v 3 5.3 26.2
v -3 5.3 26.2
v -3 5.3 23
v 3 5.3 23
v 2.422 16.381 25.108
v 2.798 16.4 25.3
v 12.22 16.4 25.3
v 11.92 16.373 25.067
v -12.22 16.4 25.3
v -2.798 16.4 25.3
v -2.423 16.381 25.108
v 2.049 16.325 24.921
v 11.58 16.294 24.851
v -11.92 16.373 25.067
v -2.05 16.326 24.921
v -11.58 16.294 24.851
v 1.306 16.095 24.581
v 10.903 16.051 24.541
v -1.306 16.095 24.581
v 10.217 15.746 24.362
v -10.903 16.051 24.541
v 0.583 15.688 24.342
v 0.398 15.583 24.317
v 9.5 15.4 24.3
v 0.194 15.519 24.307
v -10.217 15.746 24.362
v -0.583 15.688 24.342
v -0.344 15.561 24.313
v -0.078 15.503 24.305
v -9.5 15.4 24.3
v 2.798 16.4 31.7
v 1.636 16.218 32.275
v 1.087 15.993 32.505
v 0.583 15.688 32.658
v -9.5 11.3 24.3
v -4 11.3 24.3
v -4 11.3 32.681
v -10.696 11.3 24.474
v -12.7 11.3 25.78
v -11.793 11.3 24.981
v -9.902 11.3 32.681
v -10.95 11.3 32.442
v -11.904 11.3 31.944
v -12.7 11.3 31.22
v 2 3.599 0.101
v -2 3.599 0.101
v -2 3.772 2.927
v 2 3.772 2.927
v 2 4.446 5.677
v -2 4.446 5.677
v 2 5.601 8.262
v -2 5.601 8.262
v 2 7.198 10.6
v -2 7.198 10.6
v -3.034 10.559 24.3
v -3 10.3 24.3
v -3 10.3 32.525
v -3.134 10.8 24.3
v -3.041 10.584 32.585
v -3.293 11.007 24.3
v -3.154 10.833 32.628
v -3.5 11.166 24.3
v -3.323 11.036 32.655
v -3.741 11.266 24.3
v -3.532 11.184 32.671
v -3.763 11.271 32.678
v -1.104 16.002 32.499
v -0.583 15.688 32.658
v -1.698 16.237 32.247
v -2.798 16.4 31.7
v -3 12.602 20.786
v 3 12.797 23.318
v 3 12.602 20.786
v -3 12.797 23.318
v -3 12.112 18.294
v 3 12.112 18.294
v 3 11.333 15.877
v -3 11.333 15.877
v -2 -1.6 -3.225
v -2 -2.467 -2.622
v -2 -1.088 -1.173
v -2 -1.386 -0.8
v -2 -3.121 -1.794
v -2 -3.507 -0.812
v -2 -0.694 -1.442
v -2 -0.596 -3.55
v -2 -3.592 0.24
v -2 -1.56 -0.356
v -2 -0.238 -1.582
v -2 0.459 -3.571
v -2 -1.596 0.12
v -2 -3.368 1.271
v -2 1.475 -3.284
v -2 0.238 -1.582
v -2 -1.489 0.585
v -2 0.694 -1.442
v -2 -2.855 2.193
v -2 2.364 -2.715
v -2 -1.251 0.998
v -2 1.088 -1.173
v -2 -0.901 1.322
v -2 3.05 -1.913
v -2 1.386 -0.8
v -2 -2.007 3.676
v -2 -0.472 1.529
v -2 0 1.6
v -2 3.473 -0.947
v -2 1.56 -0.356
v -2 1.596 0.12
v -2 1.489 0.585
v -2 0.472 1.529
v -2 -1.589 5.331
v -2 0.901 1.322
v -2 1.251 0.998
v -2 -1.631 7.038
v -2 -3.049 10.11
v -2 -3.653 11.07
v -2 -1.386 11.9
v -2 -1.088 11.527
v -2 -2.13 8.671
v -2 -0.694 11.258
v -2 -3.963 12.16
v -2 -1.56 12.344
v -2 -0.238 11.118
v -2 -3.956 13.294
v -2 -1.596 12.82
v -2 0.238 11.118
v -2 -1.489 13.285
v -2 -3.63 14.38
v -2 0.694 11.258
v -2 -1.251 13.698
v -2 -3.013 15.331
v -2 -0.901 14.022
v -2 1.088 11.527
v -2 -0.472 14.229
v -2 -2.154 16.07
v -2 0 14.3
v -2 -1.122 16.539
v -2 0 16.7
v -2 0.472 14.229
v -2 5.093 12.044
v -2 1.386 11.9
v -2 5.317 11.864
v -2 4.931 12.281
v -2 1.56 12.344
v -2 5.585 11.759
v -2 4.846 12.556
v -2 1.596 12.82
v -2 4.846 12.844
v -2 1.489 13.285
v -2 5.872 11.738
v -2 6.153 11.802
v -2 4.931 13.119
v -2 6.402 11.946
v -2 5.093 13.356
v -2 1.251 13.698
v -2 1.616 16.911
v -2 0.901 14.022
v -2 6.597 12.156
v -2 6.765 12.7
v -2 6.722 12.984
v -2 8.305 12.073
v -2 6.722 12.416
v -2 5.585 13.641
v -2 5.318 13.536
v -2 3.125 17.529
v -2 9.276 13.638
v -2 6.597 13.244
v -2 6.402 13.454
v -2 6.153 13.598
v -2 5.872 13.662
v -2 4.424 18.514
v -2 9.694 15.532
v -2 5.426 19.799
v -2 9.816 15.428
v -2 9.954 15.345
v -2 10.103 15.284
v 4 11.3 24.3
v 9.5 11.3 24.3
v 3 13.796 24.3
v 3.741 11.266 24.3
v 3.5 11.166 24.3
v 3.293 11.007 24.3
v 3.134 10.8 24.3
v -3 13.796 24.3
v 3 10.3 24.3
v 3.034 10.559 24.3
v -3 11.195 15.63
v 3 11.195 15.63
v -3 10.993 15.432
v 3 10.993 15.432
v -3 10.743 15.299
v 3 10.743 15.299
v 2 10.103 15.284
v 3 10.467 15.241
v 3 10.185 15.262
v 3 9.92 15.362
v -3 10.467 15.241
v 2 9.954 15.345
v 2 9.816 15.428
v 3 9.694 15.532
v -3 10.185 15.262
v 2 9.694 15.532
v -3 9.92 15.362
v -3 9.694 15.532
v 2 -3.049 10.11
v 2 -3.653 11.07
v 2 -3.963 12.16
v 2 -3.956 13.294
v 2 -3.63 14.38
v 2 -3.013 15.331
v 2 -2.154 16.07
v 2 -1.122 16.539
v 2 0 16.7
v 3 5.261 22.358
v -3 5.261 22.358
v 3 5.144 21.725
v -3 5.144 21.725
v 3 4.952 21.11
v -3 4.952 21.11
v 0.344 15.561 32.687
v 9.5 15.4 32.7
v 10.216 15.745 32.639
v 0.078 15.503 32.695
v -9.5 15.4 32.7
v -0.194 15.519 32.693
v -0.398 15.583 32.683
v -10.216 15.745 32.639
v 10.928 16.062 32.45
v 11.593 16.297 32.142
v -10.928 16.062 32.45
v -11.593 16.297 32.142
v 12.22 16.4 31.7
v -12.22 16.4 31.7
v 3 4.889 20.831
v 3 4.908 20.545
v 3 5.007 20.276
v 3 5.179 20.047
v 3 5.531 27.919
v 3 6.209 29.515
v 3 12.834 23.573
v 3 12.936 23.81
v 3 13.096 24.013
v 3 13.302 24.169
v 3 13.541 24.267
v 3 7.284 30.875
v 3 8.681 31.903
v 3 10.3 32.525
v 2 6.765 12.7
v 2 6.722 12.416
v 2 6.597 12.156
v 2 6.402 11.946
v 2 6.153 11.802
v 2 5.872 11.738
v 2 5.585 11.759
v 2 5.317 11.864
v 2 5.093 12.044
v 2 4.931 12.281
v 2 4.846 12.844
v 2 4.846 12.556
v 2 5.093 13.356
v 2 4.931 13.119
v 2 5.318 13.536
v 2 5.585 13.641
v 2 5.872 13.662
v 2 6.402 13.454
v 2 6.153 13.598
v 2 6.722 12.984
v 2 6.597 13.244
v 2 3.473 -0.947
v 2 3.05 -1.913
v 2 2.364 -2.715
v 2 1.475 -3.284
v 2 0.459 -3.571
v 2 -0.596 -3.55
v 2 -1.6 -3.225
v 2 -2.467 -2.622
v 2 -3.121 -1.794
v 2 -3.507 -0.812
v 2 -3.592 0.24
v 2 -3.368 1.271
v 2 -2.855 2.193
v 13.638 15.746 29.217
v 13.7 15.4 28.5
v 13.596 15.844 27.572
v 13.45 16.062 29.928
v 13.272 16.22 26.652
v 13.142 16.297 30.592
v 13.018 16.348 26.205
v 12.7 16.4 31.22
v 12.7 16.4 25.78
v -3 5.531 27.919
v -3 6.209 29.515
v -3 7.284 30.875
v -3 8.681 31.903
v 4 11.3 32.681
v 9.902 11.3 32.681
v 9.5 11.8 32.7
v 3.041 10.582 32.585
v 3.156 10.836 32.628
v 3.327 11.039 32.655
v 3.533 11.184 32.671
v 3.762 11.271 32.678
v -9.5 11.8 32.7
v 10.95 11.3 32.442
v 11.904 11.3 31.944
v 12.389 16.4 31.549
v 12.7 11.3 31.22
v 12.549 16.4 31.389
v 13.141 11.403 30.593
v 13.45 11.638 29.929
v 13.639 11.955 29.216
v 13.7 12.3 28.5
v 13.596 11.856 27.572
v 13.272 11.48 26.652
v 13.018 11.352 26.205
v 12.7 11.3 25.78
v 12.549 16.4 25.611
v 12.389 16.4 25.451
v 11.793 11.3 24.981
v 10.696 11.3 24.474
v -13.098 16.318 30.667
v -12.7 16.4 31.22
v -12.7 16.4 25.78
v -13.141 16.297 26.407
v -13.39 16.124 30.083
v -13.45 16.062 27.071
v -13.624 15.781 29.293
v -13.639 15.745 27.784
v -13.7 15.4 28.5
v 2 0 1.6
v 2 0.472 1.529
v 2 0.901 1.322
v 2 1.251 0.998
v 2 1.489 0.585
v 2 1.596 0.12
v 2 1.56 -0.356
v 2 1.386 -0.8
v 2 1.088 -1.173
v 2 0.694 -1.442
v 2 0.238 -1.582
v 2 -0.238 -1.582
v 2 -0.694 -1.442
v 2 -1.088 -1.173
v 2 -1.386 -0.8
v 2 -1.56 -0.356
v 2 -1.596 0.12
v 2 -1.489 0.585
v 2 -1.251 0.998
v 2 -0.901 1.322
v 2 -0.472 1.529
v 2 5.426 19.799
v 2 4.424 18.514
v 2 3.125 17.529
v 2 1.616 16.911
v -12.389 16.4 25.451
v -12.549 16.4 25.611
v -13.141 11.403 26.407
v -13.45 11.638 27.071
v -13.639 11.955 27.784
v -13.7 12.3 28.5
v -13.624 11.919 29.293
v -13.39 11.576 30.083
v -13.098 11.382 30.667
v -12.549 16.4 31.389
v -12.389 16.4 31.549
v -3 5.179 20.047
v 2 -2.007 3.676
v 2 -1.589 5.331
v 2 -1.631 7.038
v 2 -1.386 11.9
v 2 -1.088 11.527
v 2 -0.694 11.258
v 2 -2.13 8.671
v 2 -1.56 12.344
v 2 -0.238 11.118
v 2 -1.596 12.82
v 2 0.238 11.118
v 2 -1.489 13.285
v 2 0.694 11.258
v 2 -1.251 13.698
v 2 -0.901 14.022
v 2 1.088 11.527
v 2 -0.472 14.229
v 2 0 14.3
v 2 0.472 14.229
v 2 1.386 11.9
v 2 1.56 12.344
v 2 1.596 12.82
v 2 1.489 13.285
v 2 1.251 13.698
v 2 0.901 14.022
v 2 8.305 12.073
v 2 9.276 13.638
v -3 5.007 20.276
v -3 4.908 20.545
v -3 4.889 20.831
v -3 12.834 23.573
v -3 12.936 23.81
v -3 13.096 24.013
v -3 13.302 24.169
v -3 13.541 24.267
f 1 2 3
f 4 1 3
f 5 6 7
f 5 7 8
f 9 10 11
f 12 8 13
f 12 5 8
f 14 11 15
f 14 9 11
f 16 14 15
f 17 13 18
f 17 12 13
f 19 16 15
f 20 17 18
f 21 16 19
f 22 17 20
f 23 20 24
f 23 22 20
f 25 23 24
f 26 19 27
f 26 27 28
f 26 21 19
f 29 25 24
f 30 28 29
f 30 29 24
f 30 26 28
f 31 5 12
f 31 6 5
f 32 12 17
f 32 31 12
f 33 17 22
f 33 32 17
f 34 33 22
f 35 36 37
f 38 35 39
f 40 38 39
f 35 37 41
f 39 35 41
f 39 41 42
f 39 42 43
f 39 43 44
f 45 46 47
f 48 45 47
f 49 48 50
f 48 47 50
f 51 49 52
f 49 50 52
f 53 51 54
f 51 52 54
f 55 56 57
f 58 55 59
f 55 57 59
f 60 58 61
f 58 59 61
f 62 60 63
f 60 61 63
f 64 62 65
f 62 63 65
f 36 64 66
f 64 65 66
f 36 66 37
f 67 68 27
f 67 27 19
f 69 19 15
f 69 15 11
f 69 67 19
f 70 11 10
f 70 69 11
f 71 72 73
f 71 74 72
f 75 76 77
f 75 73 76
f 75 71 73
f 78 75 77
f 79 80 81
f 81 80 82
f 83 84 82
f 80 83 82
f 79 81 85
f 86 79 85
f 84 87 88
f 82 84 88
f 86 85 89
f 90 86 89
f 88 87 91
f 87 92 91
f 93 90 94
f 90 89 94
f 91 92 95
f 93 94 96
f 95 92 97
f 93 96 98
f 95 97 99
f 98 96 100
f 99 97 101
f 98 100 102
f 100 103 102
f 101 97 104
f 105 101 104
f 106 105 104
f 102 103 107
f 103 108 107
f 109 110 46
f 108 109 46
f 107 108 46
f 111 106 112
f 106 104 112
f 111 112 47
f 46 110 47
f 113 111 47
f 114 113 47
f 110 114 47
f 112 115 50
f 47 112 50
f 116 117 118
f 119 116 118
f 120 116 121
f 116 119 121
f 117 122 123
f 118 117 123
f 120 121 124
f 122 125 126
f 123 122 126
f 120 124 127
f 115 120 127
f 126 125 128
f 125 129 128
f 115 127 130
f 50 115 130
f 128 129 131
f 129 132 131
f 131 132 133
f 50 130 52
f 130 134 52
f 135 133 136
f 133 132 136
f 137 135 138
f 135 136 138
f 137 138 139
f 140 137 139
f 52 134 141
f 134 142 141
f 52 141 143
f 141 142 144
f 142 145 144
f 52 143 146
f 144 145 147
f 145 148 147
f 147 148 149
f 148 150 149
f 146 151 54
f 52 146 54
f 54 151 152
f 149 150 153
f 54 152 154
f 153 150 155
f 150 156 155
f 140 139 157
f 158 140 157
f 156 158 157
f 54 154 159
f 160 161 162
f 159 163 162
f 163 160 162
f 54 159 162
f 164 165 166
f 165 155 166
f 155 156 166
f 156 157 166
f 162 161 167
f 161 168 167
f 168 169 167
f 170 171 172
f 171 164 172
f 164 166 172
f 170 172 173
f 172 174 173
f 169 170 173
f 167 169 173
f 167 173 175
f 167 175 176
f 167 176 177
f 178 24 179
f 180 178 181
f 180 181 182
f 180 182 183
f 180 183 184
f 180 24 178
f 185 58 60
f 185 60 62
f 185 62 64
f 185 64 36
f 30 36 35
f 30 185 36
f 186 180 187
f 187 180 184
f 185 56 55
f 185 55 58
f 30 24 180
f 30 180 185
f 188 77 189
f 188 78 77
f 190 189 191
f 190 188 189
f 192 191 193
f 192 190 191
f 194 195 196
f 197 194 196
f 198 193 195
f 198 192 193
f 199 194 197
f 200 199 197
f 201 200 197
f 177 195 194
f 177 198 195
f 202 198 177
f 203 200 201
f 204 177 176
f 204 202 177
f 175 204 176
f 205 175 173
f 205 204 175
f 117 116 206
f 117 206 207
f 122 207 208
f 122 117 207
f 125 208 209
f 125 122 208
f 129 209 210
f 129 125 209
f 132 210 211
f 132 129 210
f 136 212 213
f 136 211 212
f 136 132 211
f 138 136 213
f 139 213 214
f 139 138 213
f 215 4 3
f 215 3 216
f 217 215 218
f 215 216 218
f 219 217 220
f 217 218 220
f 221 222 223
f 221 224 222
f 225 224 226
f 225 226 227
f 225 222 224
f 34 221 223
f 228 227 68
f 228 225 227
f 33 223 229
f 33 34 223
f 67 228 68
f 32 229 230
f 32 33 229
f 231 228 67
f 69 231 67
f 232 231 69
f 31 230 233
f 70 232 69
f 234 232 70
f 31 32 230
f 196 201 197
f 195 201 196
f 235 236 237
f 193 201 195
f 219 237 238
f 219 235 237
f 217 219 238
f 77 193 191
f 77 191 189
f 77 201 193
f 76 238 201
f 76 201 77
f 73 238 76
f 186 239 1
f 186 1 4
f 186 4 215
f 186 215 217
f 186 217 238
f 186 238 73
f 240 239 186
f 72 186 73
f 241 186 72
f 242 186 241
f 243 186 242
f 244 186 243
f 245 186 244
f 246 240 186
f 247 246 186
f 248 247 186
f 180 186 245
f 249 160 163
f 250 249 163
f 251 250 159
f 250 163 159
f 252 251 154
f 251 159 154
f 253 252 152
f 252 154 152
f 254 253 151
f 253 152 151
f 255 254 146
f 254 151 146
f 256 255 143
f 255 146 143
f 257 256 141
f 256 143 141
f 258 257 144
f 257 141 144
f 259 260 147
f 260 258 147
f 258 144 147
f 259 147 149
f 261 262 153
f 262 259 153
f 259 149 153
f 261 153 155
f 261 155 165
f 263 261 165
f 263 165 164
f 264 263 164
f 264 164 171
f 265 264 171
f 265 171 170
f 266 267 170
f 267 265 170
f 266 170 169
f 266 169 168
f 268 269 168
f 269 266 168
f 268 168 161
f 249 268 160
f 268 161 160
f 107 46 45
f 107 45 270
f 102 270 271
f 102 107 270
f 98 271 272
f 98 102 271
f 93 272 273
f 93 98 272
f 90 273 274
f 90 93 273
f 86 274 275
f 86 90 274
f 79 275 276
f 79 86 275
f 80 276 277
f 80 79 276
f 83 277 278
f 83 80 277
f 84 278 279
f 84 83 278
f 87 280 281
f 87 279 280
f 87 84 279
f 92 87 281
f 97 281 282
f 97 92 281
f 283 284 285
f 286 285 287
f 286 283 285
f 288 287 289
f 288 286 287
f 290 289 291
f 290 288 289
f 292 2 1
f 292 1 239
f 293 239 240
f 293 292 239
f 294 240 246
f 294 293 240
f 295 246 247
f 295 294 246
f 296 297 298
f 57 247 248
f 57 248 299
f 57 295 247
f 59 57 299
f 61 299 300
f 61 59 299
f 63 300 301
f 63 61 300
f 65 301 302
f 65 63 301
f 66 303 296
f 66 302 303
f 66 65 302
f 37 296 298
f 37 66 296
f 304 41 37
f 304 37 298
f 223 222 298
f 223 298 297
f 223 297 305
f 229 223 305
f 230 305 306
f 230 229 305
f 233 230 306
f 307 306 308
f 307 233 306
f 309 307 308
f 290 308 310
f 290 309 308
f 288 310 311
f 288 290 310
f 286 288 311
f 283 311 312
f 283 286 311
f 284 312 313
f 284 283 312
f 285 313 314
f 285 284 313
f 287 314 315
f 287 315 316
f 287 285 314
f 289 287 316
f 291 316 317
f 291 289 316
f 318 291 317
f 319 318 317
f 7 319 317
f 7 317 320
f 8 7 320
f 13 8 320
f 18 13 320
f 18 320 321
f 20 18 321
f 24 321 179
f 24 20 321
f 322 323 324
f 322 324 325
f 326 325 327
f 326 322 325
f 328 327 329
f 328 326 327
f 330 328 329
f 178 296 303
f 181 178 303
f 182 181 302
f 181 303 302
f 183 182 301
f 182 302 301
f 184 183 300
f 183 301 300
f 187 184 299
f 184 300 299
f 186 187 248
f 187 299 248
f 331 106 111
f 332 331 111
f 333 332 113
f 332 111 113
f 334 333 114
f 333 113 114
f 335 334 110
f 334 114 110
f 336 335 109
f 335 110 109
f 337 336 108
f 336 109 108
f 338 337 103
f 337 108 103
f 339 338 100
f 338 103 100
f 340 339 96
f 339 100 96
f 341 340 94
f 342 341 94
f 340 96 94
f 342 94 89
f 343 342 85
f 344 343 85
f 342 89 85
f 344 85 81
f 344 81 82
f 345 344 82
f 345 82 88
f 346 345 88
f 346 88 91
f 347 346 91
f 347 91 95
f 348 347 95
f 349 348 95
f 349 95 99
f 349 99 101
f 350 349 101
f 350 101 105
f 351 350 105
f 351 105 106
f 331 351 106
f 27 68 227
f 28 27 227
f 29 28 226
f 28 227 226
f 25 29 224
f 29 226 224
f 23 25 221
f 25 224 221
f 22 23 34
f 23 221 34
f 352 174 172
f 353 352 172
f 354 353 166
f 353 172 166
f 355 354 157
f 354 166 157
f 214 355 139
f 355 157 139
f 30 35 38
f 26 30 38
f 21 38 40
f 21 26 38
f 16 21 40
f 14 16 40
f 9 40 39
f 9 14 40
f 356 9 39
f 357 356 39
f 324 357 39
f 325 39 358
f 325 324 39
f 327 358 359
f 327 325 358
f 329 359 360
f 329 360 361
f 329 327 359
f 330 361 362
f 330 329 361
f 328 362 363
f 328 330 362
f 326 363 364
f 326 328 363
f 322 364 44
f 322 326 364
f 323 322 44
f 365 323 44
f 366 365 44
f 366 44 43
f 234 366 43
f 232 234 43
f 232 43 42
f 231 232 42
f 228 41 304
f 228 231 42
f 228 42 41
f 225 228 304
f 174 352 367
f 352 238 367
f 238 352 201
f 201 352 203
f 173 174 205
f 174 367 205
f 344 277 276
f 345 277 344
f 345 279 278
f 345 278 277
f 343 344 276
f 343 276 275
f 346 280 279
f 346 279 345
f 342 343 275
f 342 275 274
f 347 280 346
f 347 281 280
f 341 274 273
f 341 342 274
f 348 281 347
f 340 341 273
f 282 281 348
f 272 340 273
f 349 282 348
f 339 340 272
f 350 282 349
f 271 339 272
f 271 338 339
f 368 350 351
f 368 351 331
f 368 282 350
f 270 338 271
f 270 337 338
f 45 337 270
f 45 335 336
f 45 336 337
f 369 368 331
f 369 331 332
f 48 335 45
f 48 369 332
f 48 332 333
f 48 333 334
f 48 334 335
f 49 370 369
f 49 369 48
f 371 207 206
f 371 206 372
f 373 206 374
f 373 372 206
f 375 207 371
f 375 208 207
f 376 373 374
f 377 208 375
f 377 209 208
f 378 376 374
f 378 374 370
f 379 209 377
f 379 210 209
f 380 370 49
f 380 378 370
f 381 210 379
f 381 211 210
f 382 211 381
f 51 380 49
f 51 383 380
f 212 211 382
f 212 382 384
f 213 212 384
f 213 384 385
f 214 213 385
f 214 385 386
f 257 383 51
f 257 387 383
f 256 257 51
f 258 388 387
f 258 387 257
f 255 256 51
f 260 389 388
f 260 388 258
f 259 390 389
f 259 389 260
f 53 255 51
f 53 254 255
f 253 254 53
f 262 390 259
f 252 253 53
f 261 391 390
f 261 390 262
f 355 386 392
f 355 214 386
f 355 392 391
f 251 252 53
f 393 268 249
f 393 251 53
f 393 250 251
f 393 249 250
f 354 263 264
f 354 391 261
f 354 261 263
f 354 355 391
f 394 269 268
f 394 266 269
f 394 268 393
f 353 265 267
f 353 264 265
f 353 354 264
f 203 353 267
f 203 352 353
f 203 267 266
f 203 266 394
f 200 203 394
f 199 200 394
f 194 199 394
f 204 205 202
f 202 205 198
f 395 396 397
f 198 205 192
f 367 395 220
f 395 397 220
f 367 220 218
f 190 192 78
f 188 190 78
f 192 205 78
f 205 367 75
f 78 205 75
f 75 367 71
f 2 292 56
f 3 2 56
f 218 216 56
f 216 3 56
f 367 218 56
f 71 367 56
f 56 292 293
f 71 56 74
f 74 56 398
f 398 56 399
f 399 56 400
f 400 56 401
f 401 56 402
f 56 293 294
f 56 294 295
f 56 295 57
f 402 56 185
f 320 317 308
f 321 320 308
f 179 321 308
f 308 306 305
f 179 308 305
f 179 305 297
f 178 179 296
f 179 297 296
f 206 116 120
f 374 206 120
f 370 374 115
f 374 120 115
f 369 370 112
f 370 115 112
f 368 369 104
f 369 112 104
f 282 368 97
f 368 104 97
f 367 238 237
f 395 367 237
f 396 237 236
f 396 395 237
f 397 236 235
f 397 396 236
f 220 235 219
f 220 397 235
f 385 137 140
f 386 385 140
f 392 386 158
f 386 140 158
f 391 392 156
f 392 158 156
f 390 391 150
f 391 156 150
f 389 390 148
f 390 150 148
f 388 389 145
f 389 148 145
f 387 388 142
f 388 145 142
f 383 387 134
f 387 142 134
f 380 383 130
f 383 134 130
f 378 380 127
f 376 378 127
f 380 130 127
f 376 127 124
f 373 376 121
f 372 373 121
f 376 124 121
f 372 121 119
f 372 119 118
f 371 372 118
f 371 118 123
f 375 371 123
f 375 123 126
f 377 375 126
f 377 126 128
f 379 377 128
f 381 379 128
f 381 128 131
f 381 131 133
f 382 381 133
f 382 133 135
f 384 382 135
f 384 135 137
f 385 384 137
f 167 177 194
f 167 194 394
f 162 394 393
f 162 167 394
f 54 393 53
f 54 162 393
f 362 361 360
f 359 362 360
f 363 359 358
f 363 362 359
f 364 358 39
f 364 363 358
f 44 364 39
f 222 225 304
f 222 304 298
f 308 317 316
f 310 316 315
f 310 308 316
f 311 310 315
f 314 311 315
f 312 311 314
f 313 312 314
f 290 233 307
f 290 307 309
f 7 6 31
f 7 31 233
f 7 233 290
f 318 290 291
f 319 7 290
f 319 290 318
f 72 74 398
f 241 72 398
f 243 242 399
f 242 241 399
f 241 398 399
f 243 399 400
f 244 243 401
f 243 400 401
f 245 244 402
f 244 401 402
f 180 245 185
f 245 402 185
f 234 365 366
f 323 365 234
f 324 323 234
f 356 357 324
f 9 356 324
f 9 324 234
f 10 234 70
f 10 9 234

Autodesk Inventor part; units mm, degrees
sketch "Skizze_4" plane through (0, 0, 0) normal (1, 0, 0) x (0, 1, 0)
  line L0 (14.3, 31.7) -> (11.8, 31.7)
  arc A0 (11.8, 31.7) -> (6.3, 26.2) centre (11.8, 26.2) ccw
  line L1 (6.3, 26.2) -> (6.3, 23)
  arc A1 (0, 16.7) -> (6.3, 23) centre (0, 23) ccw
  arc A2 (0, 16.7) -> (-3.0486, 10.1104) centre (0, 12.7) ccw
  arc A3 (-2.8546, 2.1934) -> (-3.0486, 10.1104) centre (-7.8502, 6.0319) ccw
  arc A4 (-2.8546, 2.1934) -> (3.5986, 0.1012) centre (0, 0) ccw
  arc A5 (7.1983, 10.6002) -> (3.5986, 0.1012) centre (19.3921, 0.5528) ccw
  arc A6 (7.1983, 10.6002) -> (11.8856, 24.4701) centre (-8.7, 23.7) ccw
  arc A7 (12.685, 25.3) -> (11.8856, 24.4701) centre (12.685, 24.5) ccw
  line L2 (12.685, 25.3) -> (14.3, 25.3)
  line L3 (14.3, 25.3) -> (14.3, 31.7)
  circle A8 centre (5.8, 12.7) radius 0.965
extrude "Extrusion1" add sketch "Skizze_4" along normal mid plane 4
sketch "Sketch_1" plane through (0, 0, 0) normal (1, 0, 0) x (0, 1, 0)
  line L0 (14.3, 32.7) -> (11.8, 32.7)
  arc A0 (11.8, 32.7) -> (5.3, 26.2) centre (11.8, 26.2) ccw
  line L1 (5.3, 26.2) -> (5.3, 23)
  arc A1 (4.9518, 21.1105) -> (5.3, 23) centre (0, 23) ccw
  arc A2 (4.9518, 21.1105) -> (5.1789, 20.0469) centre (5.8861, 20.754) ccw
  line L2 (5.1789, 20.0469) -> (9.6942, 15.5317)
  arc A3 (9.6942, 15.5317) -> (11.3334, 15.8766) centre (10.4013, 16.2388) ccw
  arc A4 (11.3334, 15.8766) -> (12.7966, 23.3177) centre (-8.8, 23.7) ccw
  arc A5 (13.7965, 24.3) -> (12.7966, 23.3177) centre (13.7965, 23.3) ccw
  line L3 (13.7965, 24.3) -> (14.3, 24.3)
  arc A6 (14.3, 24.3) -> (15.3, 25.3) centre (14.3, 25.3) ccw
  line L4 (15.3, 25.3) -> (15.3, 31.7)
  arc A7 (15.3, 31.7) -> (14.3, 32.7) centre (14.3, 31.7) ccw
extrude "Extrusion2" add sketch "Sketch_1" along normal mid plane 6
sketch "Skizze_5_ALT_Drilling_1" plane through (0, 0, 0) normal (0, 1, 0) x (-1, 0, 0)
  line L0 (10, 0) -> (-10, 0)
  line L1 (-10, 0) -> (-10, 1.6)
  line L2 (-10, 1.6) -> (10, 1.6)
  line L3 (10, 1.6) -> (10, 0)
  line L4 (10, 0) -> (-10, 0)
revolve "Revolution1" cut sketch "Skizze_5_ALT_Drilling_1" angle 360 about axis through (-10, 0, 0) along (-1, 0, 0)
sketch "Skizze_6_ALT_Drilling_2" plane through (0, 0, 0) normal (0, 1, 0) x (-1, 0, 0)
  line L0 (10, 12.7) -> (-10, 12.7)
  line L1 (-10, 12.7) -> (-10, 14.3)
  line L2 (-10, 14.3) -> (10, 14.3)
  line L3 (10, 14.3) -> (10, 12.7)
  line L4 (10, 12.7) -> (-10, 12.7)
revolve "Revolution2" cut sketch "Skizze_6_ALT_Drilling_2" angle 360 about axis through (-10, 0, 12.7) along (-1, 0, 0)
sketch "Sketch_2" plane through (0, 16.4, 0) normal (0, 1, 0) x (1, 0, 0)
  arc A0 (-9.5, -24.3) -> (-9.5, -32.7) centre (-9.5, -28.5) ccw
  line L0 (-9.5, -32.7) -> (9.5, -32.7)
  arc A1 (9.5, -32.7) -> (9.5, -24.3) centre (9.5, -28.5) ccw
  line L1 (9.5, -24.3) -> (-9.5, -24.3)
extrude "Extrusion3" add sketch "Sketch_2" against normal blind 6.1
sketch "Sketch_3" plane through (0, 0, 0) normal (1, 0, 0) x (0, 1, 0)
  line L0 (-12.0571, 36.1801) -> (-12.0571, -15.6384)
  line L1 (-12.0571, -15.6384) -> (20.4908, -15.6384)
  line L2 (20.4908, -15.6384) -> (20.4908, 36.1801)
  line L3 (20.4908, 36.1801) -> (-12.0571, 36.1801)
  line L4 (15.4, 32.7) -> (11.8, 32.7)
  arc A0 (11.8, 32.7) -> (5.3, 26.2) centre (11.8, 26.2) ccw
  line L5 (5.3, 26.2) -> (-6.4975, 26.2)
  line L6 (-6.4975, 26.2) -> (-6.4975, -9.3)
  line L7 (-6.4975, -9.3) -> (15.4, -9.3)
  line L8 (15.4, -9.3) -> (15.4, 24.3)
  arc A1 (15.4, 24.3) -> (16.4, 25.3) centre (15.4, 25.3) ccw
  line L9 (16.4, 25.3) -> (16.4, 31.7)
  arc A2 (16.4, 31.7) -> (15.4, 32.7) centre (15.4, 31.7) ccw
extrude "Extrusion4" cut sketch "Sketch_3" along normal mid plane 40
sketch "Sketch_4" plane through (0, 0, 32.7) normal (0, 0, 1) x (1, 0, 0)
  line L0 (-22.6525, -16.2217) -> (-3, -16.2217)
  line L1 (-3, -16.2217) -> (-3, 10.3)
  arc A0 (-3, 10.3) -> (-4, 11.3) centre (-4, 10.3) ccw
  line L2 (-4, 11.3) -> (-12.7, 11.3)
  arc A1 (-13.7, 12.3) -> (-12.7, 11.3) centre (-12.7, 12.3) ccw
  line L3 (-13.7, 12.3) -> (-13.7, 15.4)
  arc A2 (-12.7, 16.4) -> (-13.7, 15.4) centre (-12.7, 15.4) ccw
  line L4 (-12.7, 16.4) -> (-2.7982, 16.4)
  arc A3 (-0.583, 15.6875) -> (-2.7982, 16.4) centre (-2.7982, 12.6) ccw
  arc A4 (-0.583, 15.6875) -> (0.583, 15.6875) centre (0, 16.5) ccw
  arc A5 (2.7982, 16.4) -> (0.583, 15.6875) centre (2.7982, 12.6) ccw
  line L5 (2.7982, 16.4) -> (12.7, 16.4)
  arc A6 (13.7, 15.4) -> (12.7, 16.4) centre (12.7, 15.4) ccw
  line L6 (13.7, 15.4) -> (13.7, 12.3)
  arc A7 (12.7, 11.3) -> (13.7, 12.3) centre (12.7, 12.3) ccw
  line L7 (12.7, 11.3) -> (4, 11.3)
  arc A8 (4, 11.3) -> (3, 10.3) centre (4, 10.3) ccw
  line L8 (3, 10.3) -> (3, -16.2217)
  line L9 (3, -16.2217) -> (21.2638, -16.2217)
  line L10 (21.2638, -16.2217) -> (21.2638, 23.8758)
  line L11 (21.2638, 23.8758) -> (-22.6525, 23.8758)
  line L12 (-22.6525, 23.8758) -> (-22.6525, -16.2217)
extrude "Extrusion5" cut sketch "Sketch_4" against normal blind 10
ref_plane "HG1_XY" through (0, 0, 0) normal (1, 0, 0) x (0, 0, -1)
ref_plane "HG1_YZ" through (0, 0, 0) normal (0, 0, -1) x (0, 1, 0)
ref_plane "HG1_ZX" through (0, 0, 0) normal (0, 1, 0) x (1, 0, 0)
ref_plane "HG2_XY" through (0, 0, 12.7) normal (1, 0, 0) x (0, 0, -1)
ref_plane "HG2_YZ" through (0, 0, 12.7) normal (0, 0, -1) x (0, 1, 0)
ref_plane "HG2_ZX" through (0, 0, 12.7) normal (0, 1, 0) x (1, 0, 0)
ref_plane "HG3_XY" through (0, 0, 0) normal (0, 0, 1) x (1, 0, 0)
ref_plane "HG3_YZ" through (0, 0, 0) normal (1, 0, 0) x (0, 1, 0)
ref_plane "HG3_ZX" through (0, 0, 0) normal (0, 1, 0) x (0, 0, 1)
properties part number "305104_105"
